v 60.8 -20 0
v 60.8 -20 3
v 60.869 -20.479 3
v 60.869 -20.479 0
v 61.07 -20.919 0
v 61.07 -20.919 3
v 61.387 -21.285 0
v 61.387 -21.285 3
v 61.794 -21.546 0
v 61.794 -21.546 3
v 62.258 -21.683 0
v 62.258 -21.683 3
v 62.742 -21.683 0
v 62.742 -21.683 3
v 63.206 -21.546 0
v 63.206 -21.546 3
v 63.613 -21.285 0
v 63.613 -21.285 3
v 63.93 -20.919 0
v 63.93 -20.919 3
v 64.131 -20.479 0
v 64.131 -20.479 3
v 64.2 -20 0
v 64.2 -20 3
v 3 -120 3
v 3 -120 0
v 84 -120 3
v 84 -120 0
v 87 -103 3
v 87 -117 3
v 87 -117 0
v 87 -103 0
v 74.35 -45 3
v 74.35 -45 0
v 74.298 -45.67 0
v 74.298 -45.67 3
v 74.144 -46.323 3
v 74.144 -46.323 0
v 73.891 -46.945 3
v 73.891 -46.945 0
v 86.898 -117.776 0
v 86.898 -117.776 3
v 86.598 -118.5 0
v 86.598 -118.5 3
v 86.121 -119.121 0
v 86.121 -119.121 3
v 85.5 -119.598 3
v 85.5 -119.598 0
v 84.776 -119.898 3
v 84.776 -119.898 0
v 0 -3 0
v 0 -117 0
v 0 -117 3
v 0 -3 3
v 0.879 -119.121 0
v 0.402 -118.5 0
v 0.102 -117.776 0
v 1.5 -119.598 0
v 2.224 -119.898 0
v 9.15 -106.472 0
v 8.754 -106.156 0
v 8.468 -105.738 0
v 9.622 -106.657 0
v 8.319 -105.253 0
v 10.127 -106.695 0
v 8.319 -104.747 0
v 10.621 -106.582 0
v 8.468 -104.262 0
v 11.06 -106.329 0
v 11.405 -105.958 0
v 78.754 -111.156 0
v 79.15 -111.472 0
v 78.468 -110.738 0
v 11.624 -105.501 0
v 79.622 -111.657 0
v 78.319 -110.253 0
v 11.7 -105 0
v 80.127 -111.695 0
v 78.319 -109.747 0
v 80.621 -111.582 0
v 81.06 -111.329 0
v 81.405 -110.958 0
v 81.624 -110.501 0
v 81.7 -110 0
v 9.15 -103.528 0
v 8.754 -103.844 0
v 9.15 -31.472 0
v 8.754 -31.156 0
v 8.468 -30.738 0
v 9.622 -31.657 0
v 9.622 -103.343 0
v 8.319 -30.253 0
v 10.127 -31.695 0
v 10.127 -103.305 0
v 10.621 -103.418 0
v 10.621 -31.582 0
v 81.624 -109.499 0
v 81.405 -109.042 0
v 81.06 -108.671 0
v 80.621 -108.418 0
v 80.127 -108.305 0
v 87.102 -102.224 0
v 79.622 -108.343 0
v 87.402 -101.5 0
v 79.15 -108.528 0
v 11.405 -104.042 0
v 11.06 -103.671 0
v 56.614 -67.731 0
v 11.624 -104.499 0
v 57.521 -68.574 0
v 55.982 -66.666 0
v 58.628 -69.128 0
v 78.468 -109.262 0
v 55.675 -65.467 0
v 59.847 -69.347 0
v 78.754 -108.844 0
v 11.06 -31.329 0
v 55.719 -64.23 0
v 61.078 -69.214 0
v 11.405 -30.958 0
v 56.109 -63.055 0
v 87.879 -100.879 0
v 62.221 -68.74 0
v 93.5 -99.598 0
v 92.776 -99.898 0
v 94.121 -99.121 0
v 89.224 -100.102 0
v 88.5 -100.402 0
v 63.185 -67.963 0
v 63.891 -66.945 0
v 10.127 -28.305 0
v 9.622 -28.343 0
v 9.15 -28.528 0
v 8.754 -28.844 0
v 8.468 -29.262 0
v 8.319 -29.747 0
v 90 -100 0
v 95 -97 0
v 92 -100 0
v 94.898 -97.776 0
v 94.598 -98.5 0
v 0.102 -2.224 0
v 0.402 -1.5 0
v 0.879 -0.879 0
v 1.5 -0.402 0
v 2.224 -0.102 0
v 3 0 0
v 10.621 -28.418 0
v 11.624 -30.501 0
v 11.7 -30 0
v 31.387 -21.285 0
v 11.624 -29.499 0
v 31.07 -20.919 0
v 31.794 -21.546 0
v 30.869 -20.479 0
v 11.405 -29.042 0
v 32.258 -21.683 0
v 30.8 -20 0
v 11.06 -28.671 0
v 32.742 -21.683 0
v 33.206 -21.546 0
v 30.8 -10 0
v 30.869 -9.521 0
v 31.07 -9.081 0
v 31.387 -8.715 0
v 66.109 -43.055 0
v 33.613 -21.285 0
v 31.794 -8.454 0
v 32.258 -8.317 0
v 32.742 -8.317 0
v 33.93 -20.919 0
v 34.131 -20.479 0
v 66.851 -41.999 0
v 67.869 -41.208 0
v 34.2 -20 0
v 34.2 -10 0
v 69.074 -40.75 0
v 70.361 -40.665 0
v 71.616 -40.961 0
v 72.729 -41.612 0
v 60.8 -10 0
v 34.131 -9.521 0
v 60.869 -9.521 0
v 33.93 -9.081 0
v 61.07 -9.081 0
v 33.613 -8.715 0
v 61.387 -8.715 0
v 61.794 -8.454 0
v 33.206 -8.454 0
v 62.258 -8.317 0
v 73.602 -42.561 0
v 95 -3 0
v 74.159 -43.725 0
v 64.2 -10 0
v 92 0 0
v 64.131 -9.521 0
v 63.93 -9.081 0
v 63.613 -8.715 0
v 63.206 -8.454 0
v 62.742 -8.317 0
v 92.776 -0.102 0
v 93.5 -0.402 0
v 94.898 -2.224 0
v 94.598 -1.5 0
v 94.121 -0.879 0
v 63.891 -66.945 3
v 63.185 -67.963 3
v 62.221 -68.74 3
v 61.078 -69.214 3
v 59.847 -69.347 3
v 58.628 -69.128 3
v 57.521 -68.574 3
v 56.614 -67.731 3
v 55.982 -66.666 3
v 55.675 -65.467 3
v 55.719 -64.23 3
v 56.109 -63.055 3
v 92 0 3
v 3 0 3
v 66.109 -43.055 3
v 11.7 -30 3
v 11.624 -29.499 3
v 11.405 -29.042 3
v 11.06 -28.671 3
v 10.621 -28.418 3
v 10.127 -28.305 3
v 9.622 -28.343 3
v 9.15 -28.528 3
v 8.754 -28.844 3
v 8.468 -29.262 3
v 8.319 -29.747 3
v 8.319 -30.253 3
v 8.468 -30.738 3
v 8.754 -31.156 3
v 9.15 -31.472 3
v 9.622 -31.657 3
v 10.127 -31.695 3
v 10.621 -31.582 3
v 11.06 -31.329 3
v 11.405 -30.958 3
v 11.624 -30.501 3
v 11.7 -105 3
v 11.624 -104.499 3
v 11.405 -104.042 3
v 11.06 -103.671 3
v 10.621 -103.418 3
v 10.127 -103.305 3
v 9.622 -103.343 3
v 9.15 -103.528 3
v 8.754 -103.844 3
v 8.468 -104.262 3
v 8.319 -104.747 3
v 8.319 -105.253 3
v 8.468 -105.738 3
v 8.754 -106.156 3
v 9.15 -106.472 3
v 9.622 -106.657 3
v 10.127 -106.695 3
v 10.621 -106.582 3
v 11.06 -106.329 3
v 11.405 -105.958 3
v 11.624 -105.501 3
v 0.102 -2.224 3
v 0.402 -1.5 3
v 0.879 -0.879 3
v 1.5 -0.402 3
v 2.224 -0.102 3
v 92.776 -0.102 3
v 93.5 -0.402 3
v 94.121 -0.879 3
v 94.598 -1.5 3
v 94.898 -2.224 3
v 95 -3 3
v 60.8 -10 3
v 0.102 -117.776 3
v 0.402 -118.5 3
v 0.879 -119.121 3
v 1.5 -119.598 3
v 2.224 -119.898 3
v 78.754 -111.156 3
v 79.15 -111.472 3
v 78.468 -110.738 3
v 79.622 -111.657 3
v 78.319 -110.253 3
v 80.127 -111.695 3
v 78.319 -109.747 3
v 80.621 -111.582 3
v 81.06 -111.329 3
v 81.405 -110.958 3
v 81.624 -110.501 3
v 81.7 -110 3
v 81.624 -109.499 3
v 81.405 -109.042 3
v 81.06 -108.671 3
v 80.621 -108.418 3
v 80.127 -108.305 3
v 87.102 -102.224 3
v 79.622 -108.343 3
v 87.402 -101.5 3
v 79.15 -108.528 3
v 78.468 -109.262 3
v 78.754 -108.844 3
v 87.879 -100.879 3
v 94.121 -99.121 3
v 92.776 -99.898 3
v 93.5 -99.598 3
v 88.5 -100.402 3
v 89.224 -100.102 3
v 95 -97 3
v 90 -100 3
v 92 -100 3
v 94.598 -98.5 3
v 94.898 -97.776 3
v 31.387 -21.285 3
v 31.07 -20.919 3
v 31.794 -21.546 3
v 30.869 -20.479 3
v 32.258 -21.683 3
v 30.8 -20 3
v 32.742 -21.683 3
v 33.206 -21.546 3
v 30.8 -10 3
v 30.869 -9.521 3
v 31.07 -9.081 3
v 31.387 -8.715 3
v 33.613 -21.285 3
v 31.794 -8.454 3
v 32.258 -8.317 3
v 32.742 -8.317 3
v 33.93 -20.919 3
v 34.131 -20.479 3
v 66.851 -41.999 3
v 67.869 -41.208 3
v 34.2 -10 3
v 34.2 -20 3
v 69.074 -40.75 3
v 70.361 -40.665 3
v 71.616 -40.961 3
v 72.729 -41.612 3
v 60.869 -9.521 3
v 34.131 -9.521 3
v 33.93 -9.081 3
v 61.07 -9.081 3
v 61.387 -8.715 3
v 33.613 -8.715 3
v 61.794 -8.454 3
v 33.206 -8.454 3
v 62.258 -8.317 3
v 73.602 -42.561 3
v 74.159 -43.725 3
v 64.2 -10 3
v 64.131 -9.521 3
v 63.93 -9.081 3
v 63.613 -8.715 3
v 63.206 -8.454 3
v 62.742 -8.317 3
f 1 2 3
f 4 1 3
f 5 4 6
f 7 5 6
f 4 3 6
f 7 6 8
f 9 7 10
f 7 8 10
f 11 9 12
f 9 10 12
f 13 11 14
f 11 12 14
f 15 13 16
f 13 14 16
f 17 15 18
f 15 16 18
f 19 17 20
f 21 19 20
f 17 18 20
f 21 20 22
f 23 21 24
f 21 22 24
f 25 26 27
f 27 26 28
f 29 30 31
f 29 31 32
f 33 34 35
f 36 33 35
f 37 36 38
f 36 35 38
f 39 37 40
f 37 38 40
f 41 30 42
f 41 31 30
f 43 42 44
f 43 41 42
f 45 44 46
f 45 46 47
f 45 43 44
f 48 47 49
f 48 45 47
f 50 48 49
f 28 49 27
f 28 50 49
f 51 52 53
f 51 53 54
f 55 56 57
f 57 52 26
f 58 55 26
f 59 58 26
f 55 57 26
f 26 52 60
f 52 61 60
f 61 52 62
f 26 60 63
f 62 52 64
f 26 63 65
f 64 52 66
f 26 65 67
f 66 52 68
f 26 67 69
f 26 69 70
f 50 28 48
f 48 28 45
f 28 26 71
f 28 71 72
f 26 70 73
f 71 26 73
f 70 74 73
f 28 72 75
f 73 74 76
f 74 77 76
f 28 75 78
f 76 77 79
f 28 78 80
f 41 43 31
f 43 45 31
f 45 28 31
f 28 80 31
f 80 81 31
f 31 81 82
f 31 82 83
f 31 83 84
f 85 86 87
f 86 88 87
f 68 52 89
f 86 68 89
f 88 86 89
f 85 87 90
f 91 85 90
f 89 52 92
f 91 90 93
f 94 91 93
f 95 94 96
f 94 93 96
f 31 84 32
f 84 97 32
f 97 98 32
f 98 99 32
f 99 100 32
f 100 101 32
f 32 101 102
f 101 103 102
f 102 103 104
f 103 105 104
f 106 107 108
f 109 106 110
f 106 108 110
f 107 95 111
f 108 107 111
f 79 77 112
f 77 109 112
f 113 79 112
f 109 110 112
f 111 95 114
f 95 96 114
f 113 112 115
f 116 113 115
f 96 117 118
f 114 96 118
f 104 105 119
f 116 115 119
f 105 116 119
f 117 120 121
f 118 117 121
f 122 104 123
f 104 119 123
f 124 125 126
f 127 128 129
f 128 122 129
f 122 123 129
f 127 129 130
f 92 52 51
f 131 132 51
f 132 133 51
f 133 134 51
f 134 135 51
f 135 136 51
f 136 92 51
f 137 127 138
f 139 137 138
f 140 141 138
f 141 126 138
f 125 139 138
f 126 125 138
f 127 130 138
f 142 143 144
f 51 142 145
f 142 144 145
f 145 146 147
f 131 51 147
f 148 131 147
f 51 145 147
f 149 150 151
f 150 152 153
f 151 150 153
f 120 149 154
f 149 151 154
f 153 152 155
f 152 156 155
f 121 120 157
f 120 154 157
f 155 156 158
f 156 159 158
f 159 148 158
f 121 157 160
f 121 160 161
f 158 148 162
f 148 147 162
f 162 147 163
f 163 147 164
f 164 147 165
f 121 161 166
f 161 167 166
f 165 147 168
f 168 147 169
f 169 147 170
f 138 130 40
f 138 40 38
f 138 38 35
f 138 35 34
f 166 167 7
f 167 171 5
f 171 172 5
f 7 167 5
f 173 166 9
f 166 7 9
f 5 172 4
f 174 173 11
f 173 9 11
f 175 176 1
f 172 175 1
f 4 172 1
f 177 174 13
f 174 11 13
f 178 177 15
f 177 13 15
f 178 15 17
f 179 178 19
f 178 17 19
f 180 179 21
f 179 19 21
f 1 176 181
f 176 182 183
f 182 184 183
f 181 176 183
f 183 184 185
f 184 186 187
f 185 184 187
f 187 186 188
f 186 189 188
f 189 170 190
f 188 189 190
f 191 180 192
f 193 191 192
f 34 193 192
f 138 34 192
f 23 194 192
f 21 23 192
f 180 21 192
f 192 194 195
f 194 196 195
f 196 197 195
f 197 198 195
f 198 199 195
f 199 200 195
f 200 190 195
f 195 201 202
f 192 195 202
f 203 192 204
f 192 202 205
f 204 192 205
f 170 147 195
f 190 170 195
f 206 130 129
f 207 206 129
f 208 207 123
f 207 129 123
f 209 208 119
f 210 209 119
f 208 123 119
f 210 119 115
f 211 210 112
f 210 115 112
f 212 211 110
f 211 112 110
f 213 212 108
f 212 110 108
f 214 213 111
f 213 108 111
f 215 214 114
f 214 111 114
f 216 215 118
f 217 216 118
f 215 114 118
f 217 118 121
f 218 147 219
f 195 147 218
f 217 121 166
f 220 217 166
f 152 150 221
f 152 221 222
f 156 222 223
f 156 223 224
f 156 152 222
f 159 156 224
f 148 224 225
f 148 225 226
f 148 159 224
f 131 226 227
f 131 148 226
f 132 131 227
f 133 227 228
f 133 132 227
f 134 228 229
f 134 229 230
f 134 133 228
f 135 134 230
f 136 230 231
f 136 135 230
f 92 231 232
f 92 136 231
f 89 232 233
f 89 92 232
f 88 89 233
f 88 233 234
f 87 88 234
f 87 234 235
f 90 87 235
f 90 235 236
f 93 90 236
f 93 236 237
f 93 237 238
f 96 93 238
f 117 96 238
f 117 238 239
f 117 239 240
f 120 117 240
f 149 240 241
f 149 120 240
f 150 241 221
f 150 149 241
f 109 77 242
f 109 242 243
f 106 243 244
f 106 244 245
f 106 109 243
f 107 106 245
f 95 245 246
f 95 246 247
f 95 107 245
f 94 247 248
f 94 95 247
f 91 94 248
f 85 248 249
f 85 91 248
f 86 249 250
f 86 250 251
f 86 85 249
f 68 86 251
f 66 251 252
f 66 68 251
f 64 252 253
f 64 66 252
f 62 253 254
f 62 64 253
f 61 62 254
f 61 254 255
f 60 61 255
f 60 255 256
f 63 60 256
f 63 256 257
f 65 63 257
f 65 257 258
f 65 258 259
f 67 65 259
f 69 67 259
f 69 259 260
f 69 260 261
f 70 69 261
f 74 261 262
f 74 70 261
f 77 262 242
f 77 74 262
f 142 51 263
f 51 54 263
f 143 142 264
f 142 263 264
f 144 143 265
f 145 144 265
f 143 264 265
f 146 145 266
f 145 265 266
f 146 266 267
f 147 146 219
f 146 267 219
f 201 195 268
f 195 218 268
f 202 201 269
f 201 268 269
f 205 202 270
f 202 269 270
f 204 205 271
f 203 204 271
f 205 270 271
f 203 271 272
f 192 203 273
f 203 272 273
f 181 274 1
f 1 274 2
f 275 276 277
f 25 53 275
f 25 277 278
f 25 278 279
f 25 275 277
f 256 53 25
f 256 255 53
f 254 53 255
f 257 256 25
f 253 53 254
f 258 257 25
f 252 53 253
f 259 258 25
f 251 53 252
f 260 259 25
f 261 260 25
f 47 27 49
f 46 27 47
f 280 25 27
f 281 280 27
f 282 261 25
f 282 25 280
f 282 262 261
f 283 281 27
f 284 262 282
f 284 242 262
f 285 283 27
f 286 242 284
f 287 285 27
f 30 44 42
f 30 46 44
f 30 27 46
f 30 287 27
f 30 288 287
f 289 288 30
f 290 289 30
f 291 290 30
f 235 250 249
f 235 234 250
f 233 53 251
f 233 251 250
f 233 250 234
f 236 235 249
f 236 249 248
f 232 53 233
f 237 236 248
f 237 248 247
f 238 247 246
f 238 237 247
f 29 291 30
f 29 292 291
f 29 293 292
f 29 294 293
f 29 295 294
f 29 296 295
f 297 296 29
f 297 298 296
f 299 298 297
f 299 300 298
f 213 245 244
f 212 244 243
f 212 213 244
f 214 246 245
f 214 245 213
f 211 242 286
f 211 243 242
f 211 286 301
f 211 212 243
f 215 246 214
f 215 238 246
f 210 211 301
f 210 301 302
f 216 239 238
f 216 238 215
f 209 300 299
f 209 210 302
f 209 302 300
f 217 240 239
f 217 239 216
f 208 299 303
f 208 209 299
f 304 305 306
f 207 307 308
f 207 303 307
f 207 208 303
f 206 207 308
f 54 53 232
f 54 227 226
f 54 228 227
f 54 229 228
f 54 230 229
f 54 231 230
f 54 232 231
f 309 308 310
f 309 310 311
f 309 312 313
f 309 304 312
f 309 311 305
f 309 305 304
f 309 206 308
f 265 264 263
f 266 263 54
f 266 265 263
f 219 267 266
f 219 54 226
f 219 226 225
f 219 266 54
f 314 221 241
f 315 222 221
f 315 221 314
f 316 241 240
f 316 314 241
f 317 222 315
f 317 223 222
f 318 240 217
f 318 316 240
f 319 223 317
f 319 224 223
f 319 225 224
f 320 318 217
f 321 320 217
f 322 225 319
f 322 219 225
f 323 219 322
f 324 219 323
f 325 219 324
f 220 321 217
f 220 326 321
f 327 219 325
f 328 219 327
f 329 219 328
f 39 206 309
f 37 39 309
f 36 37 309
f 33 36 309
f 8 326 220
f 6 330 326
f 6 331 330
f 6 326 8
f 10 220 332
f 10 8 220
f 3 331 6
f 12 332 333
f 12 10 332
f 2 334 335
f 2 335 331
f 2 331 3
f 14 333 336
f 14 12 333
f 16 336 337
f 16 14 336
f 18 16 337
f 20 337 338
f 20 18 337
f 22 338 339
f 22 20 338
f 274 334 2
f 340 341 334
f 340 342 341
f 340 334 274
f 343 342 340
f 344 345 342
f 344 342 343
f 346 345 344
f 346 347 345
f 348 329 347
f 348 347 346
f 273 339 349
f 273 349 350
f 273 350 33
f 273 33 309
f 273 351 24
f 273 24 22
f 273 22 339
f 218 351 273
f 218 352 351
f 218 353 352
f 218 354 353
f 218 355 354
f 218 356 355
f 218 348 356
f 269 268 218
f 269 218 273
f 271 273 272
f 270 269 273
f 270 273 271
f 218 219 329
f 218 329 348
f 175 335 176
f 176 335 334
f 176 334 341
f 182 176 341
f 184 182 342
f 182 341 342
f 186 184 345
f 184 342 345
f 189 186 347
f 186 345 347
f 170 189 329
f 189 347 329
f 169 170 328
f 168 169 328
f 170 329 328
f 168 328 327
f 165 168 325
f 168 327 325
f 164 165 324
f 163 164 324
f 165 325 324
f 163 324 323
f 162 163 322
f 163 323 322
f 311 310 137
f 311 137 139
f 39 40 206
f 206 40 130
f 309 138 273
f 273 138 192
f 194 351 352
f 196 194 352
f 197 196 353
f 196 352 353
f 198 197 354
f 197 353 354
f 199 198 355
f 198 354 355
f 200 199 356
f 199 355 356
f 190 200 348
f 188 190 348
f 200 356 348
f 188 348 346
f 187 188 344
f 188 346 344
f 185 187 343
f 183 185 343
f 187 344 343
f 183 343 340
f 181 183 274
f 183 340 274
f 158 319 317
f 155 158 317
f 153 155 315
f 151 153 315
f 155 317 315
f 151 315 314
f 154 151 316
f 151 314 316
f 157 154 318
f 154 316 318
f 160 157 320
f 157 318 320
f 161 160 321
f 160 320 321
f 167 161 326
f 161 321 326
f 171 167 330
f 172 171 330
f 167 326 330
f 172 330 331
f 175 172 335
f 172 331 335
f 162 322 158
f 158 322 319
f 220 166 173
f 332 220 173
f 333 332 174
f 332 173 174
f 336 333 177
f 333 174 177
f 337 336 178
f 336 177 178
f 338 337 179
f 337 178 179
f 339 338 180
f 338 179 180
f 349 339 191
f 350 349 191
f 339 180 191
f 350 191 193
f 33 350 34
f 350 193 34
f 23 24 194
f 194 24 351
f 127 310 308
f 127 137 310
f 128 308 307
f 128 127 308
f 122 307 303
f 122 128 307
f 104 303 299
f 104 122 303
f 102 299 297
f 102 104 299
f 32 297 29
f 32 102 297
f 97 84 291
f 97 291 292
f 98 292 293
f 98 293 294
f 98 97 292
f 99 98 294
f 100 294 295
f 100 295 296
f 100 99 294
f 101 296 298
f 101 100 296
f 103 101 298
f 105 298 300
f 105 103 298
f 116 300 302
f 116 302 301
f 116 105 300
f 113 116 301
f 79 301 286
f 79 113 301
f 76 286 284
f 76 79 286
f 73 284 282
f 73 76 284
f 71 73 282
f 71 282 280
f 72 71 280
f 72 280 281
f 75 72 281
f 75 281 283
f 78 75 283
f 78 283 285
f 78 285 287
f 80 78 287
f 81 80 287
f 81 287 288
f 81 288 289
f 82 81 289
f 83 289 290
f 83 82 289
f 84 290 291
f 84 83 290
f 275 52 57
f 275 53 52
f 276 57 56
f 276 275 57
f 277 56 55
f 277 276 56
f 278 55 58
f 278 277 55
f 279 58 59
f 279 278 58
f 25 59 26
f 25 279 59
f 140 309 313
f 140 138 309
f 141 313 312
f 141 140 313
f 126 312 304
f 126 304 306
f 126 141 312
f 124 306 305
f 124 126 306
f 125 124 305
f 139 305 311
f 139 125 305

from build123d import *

# Parameters (mm, degrees)
SKETCH1_W           = 95
SKETCH1_H           = 120
SKETCH1_R           = 1.7
BOSS_EXTRUDE1_DEPTH = 3
FILLET1_R           = 3
CUT_EXTRUDE1_DEPTH  = 10
SKETCH3_W           = 8
SKETCH3_H           = 20
CUT_EXTRUDE2_DEPTH  = 4
FILLET2_R           = 3


with BuildPart() as part:
    # Sketch1 → Boss-Extrude1 (new body)
    with BuildSketch(Plane.XY):
        with Locations((47.5, -60)):
            Rectangle(SKETCH1_W, SKETCH1_H)
        with Locations((10, -105)):
            Circle(SKETCH1_R, mode=Mode.SUBTRACT)
        with Locations((80, -110)):
            Circle(SKETCH1_R, mode=Mode.SUBTRACT)
        with Locations((10, -30)):
            Circle(SKETCH1_R, mode=Mode.SUBTRACT)
        with BuildLine():
            Line((56.109241719, -63.05462086), (66.109241719, -43.05462086))
            ThreePointArc((66.109241719, -43.05462086), (70.999425204, -40.766366896), (74.35, -45))
            ThreePointArc((74.35, -45), (74.233633104, -45.999425204), (73.890758281, -46.94537914))
            Line((73.890758281, -46.94537914), (63.890758281, -66.94537914))
            ThreePointArc((63.890758281, -66.94537914), (58.05462086, -68.890758281), (56.109241719, -63.05462086))
        make_face(mode=Mode.SUBTRACT)
    extrude(amount=BOSS_EXTRUDE1_DEPTH)

    # Fillet1
    fillet1_edges = [part.edges().sort_by_distance(p)[0] for p in [
        (0, -120, 1.5),
        (0, 0, 1.5),
        (95, 0, 1.5),
        (95, -120, 1.5),
    ]]
    fillet(fillet1_edges, radius=FILLET1_R)

    # Sketch2 → Cut-Extrude1 (cut)
    with BuildSketch(Plane.XY.offset(3)):
        with BuildLine():
            Line((30.8, -10), (30.8, -20))
            ThreePointArc((30.8, -20), (32.5, -21.7), (34.2, -20))
            Line((34.2, -20), (34.2, -10))
            ThreePointArc((34.2, -10), (32.5, -8.3), (30.8, -10))
        make_face()
        with BuildLine():
            Line((60.8, -10), (60.8, -20))
            ThreePointArc((60.8, -20), (62.5, -21.7), (64.2, -20))
            Line((64.2, -20), (64.2, -10))
            ThreePointArc((64.2, -10), (62.5, -8.3), (60.8, -10))
        make_face()
    extrude(amount=-CUT_EXTRUDE1_DEPTH, mode=Mode.SUBTRACT)

    # Sketch3 → Cut-Extrude2 (cut, through all)
    with BuildSketch(Plane.XY.offset(3)):
        with Locations((91, -110)):
            Rectangle(SKETCH3_W, SKETCH3_H)
    extrude(amount=-CUT_EXTRUDE2_DEPTH, mode=Mode.SUBTRACT)

    # Fillet2
    fillet2_edges = [part.edges().sort_by_distance(p)[0] for p in [
        (95, -100, 1.5),
        (87, -120, 1.5),
        (87, -100, 1.5),
    ]]
    fillet(fillet2_edges, radius=FILLET2_R)


solid = part.part
